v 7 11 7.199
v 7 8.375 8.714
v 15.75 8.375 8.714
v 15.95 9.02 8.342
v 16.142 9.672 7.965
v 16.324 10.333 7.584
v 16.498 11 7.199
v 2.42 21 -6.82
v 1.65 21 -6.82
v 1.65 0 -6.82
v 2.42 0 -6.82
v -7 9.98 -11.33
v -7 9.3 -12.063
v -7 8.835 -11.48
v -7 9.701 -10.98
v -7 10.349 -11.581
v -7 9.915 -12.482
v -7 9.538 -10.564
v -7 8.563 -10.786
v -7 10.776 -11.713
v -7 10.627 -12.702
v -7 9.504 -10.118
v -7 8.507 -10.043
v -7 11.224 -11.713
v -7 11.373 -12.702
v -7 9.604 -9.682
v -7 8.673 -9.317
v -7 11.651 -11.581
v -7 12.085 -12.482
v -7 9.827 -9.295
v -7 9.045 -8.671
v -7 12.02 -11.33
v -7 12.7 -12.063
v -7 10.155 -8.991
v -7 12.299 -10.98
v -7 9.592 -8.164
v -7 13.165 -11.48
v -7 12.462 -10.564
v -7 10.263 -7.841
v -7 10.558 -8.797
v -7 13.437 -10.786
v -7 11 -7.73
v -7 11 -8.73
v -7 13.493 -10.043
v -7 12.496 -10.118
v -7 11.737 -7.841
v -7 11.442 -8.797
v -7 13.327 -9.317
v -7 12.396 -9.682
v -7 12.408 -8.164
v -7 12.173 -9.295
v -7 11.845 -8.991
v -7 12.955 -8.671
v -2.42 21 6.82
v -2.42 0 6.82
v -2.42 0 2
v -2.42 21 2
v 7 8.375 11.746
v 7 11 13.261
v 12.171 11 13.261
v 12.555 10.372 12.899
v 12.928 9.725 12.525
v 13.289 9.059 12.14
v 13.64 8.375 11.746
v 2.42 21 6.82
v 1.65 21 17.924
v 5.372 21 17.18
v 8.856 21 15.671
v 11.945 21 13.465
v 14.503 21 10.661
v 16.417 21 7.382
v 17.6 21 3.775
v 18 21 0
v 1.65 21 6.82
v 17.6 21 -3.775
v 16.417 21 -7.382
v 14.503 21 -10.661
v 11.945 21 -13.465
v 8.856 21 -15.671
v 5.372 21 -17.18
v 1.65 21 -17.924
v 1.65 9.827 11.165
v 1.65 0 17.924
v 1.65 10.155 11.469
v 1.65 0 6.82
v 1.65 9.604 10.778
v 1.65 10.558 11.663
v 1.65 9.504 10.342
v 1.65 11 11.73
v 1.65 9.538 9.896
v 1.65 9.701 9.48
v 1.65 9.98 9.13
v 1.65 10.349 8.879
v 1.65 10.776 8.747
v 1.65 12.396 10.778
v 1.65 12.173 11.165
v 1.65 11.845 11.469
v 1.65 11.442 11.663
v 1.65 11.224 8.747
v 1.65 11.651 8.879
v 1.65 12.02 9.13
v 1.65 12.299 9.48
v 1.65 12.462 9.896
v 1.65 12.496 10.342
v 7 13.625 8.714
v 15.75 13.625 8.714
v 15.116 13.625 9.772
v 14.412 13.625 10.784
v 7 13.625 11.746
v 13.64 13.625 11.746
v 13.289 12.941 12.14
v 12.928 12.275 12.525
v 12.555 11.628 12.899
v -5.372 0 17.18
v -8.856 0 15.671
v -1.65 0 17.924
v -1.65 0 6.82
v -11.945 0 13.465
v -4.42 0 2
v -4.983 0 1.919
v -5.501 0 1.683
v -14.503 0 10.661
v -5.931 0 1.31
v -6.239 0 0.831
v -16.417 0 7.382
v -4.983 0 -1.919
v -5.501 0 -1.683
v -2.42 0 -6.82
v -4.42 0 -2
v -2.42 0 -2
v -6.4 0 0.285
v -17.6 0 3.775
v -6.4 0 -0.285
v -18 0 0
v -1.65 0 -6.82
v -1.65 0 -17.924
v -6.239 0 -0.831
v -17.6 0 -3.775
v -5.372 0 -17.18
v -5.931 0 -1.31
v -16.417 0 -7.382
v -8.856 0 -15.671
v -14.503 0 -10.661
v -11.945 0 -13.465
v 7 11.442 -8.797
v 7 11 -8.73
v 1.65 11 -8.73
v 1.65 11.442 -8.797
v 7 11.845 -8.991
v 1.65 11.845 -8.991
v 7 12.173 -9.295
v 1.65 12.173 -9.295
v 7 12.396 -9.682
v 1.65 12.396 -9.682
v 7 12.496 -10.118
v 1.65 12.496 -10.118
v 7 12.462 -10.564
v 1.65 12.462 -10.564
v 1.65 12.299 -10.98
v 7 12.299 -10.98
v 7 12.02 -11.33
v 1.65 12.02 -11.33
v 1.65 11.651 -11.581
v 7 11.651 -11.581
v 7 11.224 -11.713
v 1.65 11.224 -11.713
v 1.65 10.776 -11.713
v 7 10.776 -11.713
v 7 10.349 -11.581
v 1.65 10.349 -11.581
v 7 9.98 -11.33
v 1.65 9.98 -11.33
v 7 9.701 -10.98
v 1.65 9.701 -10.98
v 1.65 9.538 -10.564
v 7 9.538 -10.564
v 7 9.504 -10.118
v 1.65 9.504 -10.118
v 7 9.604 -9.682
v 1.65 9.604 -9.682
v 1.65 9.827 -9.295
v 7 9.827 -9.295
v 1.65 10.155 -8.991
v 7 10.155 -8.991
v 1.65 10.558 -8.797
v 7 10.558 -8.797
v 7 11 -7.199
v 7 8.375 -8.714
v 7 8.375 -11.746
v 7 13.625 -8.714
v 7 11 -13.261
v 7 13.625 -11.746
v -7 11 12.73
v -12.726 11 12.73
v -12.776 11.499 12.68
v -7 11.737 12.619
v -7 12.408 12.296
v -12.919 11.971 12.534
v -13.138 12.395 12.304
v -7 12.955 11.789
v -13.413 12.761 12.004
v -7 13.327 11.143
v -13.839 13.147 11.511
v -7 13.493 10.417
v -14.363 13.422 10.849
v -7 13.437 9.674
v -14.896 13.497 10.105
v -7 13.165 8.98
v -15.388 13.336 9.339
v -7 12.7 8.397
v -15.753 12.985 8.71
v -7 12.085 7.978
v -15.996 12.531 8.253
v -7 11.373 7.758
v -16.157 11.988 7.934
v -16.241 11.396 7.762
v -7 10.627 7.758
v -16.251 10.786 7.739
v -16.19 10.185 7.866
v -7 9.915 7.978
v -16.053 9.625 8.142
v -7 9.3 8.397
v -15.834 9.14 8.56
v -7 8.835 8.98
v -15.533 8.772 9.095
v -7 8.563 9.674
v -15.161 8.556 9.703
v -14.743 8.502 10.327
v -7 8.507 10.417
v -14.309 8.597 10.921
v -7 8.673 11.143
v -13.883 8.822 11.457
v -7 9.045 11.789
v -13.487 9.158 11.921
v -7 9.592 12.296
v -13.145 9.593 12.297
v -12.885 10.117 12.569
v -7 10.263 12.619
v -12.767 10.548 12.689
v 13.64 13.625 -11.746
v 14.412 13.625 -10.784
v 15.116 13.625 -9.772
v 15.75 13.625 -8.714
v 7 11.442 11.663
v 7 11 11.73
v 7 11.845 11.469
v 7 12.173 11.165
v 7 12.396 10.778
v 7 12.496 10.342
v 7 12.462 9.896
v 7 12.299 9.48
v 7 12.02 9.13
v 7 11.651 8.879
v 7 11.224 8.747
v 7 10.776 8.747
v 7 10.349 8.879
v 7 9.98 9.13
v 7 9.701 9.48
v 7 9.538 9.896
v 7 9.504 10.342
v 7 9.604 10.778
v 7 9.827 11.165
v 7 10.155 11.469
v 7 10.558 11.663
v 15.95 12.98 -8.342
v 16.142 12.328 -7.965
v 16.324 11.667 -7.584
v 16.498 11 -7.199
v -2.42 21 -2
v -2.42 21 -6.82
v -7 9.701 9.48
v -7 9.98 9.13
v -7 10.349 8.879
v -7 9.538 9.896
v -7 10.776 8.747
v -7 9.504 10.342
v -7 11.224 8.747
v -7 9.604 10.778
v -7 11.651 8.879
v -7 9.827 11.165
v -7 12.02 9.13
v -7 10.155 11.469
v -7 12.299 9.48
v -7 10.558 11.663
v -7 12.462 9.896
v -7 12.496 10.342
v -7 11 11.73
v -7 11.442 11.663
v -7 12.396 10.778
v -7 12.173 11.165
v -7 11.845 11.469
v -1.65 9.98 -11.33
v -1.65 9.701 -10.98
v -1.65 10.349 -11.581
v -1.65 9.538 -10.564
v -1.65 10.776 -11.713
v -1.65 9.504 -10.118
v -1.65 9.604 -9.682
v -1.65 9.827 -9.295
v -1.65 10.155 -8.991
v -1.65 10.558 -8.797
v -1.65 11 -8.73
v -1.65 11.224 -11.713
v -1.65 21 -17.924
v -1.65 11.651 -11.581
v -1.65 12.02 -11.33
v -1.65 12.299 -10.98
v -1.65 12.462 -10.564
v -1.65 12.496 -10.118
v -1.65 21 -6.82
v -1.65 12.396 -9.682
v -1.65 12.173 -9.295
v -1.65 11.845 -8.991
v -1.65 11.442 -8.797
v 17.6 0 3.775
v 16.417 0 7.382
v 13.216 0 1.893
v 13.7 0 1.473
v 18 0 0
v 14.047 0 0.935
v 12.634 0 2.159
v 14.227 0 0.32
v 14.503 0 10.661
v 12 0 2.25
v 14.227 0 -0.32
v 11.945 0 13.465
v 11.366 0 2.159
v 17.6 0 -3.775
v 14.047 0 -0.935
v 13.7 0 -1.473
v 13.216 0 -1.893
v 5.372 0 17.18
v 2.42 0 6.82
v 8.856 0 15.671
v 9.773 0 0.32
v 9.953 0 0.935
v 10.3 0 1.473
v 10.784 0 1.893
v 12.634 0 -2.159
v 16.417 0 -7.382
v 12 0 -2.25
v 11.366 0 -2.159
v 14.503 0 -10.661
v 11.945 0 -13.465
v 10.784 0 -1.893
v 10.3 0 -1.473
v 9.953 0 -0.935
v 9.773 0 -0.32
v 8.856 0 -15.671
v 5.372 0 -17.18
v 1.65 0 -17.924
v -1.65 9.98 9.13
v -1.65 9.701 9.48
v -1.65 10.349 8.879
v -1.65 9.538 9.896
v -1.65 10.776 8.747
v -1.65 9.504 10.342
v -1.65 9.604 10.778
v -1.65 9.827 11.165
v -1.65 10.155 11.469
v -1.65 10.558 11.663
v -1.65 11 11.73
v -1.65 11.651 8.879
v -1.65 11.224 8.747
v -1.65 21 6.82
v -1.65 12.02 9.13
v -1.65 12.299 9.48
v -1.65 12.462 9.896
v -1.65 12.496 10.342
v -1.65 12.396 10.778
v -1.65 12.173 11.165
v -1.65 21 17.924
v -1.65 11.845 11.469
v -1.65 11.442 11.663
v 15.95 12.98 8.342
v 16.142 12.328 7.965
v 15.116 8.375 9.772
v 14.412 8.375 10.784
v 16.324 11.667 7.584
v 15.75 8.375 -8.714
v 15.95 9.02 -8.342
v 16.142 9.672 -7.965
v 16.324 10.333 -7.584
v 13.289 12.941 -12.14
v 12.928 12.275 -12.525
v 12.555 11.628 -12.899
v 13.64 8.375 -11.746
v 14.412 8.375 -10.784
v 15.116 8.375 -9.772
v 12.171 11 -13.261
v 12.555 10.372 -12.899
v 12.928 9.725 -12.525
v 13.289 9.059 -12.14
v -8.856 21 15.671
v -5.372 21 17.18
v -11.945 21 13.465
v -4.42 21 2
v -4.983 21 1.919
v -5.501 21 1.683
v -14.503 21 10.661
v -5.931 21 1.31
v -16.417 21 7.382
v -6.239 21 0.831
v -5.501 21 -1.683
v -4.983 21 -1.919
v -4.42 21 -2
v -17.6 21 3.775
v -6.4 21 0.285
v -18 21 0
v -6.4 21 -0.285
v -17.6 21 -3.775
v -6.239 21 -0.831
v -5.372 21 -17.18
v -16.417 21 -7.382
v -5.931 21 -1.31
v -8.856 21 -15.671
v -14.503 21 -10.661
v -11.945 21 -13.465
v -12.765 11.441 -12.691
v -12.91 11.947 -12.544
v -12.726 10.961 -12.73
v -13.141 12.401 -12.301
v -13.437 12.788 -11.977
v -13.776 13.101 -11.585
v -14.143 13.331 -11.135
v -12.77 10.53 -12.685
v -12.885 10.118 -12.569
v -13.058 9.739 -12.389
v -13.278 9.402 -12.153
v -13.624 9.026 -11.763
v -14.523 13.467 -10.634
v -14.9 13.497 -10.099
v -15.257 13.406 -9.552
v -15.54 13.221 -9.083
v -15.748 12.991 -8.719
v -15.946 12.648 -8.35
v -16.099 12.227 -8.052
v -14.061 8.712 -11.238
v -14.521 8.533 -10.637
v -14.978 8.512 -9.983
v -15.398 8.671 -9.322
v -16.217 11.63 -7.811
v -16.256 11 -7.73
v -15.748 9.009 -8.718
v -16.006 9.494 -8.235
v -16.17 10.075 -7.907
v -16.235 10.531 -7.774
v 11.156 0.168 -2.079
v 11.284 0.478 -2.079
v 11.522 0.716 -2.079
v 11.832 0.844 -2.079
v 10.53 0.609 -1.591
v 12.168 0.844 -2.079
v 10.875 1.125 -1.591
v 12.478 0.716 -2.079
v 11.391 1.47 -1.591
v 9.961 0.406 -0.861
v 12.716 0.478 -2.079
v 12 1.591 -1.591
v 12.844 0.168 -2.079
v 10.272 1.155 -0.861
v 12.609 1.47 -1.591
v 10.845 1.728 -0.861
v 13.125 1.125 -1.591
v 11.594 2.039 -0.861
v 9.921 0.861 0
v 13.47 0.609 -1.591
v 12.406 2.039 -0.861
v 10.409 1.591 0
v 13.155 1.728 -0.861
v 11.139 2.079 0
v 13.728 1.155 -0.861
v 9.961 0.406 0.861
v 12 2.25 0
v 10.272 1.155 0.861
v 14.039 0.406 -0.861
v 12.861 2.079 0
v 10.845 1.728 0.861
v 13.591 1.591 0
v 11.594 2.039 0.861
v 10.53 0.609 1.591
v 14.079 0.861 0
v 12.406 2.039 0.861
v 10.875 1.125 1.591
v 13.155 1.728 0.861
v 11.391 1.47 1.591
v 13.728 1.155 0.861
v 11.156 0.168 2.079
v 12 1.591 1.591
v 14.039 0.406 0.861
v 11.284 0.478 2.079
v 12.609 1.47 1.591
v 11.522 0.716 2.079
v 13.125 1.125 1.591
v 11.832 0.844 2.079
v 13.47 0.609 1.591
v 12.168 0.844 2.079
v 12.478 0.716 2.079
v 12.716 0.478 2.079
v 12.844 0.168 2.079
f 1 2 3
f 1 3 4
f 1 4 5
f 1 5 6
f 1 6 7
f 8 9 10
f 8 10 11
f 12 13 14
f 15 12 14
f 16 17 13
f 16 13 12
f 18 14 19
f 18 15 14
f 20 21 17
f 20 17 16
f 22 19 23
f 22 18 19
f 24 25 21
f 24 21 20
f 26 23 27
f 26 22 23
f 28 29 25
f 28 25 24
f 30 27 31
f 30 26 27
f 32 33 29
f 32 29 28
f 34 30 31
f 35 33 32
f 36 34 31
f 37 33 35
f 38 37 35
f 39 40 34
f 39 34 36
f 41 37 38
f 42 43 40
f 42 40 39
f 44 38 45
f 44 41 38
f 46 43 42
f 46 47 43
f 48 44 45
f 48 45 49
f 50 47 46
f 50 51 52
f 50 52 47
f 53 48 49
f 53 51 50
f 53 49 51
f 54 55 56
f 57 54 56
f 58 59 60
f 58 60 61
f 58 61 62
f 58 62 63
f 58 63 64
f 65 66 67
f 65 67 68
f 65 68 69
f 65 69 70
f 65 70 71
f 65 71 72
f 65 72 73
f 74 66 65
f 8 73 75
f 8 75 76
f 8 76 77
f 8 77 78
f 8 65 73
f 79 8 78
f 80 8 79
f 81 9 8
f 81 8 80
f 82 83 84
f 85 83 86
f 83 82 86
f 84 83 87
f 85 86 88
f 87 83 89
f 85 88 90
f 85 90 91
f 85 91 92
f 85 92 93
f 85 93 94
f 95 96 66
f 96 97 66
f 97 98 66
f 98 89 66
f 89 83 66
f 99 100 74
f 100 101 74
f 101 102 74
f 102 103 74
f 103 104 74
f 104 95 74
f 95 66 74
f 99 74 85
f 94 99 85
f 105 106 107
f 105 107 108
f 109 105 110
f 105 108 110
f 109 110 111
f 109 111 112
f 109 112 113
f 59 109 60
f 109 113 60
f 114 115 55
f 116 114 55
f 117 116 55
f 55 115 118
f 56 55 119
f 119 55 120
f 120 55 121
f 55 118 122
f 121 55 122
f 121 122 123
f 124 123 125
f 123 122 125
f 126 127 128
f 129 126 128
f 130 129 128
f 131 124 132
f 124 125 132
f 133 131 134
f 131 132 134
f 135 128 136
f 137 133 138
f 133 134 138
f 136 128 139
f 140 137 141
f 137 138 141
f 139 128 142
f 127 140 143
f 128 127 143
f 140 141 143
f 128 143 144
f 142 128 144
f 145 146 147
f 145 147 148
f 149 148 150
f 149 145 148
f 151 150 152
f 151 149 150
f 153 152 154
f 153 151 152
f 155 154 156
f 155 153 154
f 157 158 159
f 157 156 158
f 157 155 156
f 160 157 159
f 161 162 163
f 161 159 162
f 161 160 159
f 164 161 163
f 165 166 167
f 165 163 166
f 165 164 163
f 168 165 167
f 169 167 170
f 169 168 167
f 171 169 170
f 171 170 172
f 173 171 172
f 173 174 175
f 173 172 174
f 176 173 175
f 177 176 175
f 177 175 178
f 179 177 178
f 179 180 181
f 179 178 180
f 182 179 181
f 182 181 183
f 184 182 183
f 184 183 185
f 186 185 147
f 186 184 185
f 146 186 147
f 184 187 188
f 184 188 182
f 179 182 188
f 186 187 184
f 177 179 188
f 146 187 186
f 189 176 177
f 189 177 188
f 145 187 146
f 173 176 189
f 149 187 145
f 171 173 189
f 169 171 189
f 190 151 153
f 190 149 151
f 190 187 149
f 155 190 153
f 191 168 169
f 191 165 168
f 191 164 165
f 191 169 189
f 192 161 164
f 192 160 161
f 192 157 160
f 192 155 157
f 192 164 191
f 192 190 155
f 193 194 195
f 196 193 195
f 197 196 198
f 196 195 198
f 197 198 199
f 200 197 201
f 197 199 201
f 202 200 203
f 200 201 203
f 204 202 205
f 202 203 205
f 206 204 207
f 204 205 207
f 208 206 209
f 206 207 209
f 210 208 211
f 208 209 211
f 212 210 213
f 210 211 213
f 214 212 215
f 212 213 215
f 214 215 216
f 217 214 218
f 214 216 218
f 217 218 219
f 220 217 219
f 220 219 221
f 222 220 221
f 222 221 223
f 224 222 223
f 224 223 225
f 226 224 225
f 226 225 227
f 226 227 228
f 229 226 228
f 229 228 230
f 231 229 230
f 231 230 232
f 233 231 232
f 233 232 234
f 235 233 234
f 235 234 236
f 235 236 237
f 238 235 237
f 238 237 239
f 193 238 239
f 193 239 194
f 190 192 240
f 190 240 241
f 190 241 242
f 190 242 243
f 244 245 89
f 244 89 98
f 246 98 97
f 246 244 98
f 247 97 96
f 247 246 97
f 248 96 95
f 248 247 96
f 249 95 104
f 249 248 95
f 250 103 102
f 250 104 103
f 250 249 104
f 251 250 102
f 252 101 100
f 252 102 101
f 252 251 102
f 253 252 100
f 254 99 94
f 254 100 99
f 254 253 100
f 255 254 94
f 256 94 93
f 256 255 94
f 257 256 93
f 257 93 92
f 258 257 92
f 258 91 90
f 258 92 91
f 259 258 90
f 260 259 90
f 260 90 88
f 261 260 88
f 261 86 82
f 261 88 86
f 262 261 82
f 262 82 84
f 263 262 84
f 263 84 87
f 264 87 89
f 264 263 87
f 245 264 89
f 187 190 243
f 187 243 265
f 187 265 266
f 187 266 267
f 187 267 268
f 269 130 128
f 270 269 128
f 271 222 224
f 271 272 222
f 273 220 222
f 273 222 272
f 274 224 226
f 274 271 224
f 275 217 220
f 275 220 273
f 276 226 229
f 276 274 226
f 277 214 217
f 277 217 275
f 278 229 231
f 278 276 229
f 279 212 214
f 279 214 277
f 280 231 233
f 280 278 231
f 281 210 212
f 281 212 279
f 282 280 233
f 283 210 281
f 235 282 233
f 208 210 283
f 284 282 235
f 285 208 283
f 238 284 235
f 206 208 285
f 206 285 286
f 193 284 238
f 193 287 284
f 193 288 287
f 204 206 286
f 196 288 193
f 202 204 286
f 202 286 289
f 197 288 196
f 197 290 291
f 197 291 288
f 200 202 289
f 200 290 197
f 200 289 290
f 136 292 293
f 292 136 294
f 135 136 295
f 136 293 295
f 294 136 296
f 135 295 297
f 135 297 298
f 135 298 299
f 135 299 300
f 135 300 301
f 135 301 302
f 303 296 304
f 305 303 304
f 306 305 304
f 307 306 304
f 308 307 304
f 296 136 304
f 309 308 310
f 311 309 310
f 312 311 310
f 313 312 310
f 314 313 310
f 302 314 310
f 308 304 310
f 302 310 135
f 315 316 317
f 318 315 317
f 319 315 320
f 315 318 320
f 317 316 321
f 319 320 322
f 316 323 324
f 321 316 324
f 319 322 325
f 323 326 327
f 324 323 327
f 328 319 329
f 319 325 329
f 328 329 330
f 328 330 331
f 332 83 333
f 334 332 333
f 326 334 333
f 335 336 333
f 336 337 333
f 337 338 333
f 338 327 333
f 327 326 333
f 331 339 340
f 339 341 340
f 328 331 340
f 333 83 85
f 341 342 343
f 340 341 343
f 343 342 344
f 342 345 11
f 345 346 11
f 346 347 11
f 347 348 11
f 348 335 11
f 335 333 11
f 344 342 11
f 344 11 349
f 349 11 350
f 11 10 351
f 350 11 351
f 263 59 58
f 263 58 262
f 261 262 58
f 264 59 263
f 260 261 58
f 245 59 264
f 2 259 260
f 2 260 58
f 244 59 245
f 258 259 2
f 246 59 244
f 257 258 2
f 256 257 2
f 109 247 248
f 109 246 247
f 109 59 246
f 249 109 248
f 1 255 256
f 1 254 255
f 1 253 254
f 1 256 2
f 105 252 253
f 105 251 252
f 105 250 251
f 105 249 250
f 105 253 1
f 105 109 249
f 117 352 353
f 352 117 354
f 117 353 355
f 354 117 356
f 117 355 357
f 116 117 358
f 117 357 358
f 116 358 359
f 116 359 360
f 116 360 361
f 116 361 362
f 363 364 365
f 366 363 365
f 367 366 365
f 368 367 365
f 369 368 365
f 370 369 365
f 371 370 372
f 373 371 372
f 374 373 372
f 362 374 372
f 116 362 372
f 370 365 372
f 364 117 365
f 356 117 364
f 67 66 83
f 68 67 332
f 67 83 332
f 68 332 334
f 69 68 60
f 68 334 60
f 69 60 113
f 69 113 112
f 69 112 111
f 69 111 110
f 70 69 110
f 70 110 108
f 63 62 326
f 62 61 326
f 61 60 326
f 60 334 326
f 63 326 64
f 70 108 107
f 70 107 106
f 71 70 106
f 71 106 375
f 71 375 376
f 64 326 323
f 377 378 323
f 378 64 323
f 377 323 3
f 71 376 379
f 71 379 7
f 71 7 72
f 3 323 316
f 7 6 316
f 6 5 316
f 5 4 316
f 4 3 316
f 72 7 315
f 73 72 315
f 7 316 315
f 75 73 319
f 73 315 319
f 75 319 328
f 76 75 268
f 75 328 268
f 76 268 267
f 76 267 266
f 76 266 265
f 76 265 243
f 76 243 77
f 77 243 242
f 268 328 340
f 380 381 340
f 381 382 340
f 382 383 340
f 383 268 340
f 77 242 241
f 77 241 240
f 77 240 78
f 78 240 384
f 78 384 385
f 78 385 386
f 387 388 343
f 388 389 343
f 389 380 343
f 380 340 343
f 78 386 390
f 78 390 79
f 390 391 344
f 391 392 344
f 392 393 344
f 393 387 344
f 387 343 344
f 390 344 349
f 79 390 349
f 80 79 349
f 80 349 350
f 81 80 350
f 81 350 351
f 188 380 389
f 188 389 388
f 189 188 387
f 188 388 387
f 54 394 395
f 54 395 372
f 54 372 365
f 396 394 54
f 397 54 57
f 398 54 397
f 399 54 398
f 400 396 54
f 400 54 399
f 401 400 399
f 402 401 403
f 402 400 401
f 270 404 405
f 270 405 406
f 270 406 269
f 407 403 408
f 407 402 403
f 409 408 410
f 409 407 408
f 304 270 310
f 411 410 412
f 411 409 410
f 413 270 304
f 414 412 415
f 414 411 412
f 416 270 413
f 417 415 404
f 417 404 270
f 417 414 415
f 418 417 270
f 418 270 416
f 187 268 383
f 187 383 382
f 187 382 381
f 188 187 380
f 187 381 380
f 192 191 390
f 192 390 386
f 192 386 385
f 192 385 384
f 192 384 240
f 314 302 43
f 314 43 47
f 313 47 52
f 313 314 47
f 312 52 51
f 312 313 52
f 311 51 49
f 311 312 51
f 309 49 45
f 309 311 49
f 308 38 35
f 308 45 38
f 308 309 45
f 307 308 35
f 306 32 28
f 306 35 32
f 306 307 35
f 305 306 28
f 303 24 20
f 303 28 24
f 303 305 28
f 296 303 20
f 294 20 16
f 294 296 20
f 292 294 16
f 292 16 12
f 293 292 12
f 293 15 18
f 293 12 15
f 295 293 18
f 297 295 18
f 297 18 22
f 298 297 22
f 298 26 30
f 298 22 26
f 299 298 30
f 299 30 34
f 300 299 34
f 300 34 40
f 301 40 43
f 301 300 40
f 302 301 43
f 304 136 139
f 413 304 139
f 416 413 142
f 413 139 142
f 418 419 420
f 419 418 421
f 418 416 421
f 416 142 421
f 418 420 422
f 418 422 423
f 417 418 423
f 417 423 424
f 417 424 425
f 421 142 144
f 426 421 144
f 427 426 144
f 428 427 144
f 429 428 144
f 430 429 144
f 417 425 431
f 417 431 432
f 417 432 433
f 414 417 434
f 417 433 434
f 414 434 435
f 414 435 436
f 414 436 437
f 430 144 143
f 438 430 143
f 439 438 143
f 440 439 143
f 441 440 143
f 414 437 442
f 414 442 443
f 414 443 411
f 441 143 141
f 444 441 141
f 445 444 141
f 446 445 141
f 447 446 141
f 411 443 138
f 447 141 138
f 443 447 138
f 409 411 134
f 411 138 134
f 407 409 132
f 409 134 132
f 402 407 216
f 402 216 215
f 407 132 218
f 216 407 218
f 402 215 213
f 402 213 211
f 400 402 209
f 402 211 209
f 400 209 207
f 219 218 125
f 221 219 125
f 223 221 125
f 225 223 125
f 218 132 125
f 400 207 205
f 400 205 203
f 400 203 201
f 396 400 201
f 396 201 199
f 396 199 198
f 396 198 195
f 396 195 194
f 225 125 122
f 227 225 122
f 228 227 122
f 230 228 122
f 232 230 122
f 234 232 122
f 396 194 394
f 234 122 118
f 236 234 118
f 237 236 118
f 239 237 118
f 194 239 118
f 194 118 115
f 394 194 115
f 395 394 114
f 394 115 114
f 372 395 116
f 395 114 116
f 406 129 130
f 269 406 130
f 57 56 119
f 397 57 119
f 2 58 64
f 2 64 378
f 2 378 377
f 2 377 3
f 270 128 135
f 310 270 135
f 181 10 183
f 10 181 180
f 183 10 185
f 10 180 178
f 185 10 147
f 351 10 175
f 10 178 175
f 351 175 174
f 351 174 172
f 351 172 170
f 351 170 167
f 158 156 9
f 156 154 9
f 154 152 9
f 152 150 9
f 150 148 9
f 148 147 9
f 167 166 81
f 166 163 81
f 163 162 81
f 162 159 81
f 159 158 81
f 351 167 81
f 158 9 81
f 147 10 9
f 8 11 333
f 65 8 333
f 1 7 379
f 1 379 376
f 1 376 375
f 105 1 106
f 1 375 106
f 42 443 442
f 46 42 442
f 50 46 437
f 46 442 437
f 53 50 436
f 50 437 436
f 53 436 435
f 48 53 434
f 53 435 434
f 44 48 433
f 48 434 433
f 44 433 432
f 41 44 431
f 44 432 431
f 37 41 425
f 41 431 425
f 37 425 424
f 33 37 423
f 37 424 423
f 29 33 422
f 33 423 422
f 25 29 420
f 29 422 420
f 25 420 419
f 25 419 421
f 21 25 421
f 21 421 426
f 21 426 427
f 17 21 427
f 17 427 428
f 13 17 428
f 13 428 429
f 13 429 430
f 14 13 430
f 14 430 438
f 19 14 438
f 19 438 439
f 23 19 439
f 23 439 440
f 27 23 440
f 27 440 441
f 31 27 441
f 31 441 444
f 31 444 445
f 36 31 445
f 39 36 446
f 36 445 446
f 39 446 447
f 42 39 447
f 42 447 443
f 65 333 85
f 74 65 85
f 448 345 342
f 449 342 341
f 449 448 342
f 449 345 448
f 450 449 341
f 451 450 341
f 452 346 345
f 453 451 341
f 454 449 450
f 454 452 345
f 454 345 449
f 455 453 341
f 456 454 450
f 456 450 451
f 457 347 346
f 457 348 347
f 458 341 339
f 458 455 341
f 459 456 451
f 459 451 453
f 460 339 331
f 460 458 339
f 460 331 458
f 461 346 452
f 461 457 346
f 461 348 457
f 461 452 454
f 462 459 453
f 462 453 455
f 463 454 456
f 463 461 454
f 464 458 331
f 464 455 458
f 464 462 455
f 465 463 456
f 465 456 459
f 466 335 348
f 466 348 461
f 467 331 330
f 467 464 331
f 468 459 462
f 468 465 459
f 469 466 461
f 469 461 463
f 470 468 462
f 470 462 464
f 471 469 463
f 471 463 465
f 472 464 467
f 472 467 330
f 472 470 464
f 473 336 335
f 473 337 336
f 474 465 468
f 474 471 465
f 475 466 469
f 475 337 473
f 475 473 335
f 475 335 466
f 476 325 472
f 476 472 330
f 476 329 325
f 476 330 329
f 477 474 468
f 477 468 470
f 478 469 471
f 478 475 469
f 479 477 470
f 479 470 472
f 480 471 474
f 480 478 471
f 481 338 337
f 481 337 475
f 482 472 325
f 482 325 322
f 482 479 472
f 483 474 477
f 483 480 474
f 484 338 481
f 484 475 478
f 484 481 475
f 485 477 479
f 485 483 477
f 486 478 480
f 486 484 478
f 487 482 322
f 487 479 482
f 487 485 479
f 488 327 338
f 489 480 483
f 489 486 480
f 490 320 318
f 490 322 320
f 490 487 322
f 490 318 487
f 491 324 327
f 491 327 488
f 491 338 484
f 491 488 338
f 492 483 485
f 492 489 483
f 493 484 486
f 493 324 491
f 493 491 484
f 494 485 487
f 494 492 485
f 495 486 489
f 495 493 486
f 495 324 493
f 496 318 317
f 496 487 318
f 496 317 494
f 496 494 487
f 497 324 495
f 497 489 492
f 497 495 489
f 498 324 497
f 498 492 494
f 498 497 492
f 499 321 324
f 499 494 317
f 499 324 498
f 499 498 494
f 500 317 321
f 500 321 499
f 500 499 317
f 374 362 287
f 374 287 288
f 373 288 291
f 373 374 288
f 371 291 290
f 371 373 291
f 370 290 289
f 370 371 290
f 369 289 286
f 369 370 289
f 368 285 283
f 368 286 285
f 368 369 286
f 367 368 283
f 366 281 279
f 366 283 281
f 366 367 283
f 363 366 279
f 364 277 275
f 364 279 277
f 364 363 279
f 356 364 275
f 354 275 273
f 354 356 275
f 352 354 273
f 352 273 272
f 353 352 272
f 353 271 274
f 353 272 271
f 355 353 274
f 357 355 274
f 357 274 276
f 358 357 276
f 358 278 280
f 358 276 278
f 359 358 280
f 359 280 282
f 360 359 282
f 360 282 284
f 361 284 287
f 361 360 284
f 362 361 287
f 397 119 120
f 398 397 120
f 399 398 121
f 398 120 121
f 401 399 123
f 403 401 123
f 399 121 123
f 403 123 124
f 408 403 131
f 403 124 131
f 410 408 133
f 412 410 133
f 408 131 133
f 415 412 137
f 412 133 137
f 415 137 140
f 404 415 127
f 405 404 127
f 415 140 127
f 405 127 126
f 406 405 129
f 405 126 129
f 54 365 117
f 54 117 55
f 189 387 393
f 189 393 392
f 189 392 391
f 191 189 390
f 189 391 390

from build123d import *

# Parameters (mm, degrees)
SKETCH1_R               = 18
BOSS_EXTRUDE1_DEPTH     = 21
CUT_EXTRUDE1_DEPTH      = 34
CUT_EXTRUDE1_DEPTH_BACK = 34
CUT_EXTRUDE2_DEPTH      = 46.398237851
CUT_EXTRUDE2_DEPTH_BACK = 46.398237851
SKETCH7_R               = 1.5
SKETCH8_R               = 2.5
CUT_EXTRUDE3_DEPTH      = 11
CUT_EXTRUDE4_DEPTH      = 11
CUT_EXTRUDE7_DEPTH      = 34.000000173


with BuildPart() as part:
    # Sketch1 → Boss-Extrude1 (new body)
    with BuildSketch(Plane(origin=(0, 0, 0), x_dir=(1, 0, 0), z_dir=(0, 1, 0))):
        with Locations(Location((0, 0, 0), (0, 0, 90))):
            Circle(SKETCH1_R)
    extrude(amount=BOSS_EXTRUDE1_DEPTH)

    # Sketch5 → Cut-Revolve2 (revolve, cut)
    with BuildSketch(Plane(origin=(0, 0, 0), x_dir=(-1, 0, 0), z_dir=(0, -1, 0))):
        with BuildLine():
            Line((-12, -2.25), (-12, 2.25))
            ThreePointArc((-12, 2.25), (-9.75, 0), (-12, -2.25))
        make_face()
    revolve(axis=Axis((12, 0, 2.25), (0, 0, -1)), mode=Mode.SUBTRACT)

    # Sketch6 → Cut-Extrude1 (cut, two sides: drawn at the far end of the back side and taken through both)
    with BuildSketch(Plane(origin=(0, 21, 0), x_dir=(1, 0, 0), z_dir=(0, 1, 0)).offset(-CUT_EXTRUDE1_DEPTH_BACK)):
        with BuildLine():
            Line((-4.42, 2), (-2.42, 2))
            Line((-2.42, 2), (-2.42, 6.82))
            Line((-2.42, 6.82), (2.42, 6.82))
            Line((2.42, 6.82), (2.42, -6.82))
            Line((2.42, -6.82), (-2.42, -6.82))
            Line((-2.42, -6.82), (-2.42, -2))
            Line((-2.42, -2), (-4.42, -2))
            ThreePointArc((-4.42, -2), (-6.42, 0), (-4.42, 2))
        make_face()
    extrude(amount=CUT_EXTRUDE1_DEPTH + CUT_EXTRUDE1_DEPTH_BACK, mode=Mode.SUBTRACT)

    # Sketch7 → Cut-Extrude2 (cut, two sides: drawn at the far end of the back side and taken through both)
    with BuildSketch(Plane.ZY.offset(18).offset(-CUT_EXTRUDE2_DEPTH_BACK)):
        with Locations((-10.23, 11)):
            Circle(SKETCH7_R)
        with Locations((10.23, 11)):
            Circle(SKETCH7_R)
    extrude(amount=CUT_EXTRUDE2_DEPTH + CUT_EXTRUDE2_DEPTH_BACK, mode=Mode.SUBTRACT)

    # Sketch8 → Cut-Extrude3 (cut)
    with BuildSketch(Plane.ZY.offset(18)):
        with Locations((-10.23, 11)):
            Circle(SKETCH8_R)
        with Locations((10.23, 11)):
            Circle(SKETCH8_R)
    extrude(amount=-CUT_EXTRUDE3_DEPTH, mode=Mode.SUBTRACT)

    # Sketch9 → Cut-Extrude4 (cut)
    with BuildSketch(Plane(origin=(18, 0, 0), x_dir=(0, 0, -1), z_dir=(1, 0, 0))):
        Polygon((-8.714455543, 13.625), (-11.745544457, 13.625), (-13.261088913, 11), (-11.745544457, 8.375), (-8.714455543, 8.375), (-7.198911087, 11), align=None)
        Polygon((11.745544457, 13.625), (8.714455543, 13.625), (7.198911087, 11), (8.714455543, 8.375), (11.745544457, 8.375), (13.261088913, 11), align=None)
    extrude(amount=-CUT_EXTRUDE4_DEPTH, mode=Mode.SUBTRACT)

    # Sketch14 → Cut-Extrude7 (cut, through all)
    with BuildSketch(Plane(origin=(0, 21, 0), x_dir=(1, 0, 0), z_dir=(0, 1, 0))):
        with BuildLine():
            ThreePointArc((1.65, 17.924215464), (0.825869738, 17.981043884), (0, 18))
            ThreePointArc((0, 18), (-0.825869738, 17.981043884), (-1.65, 17.924215464))
            Line((-1.65, 17.924215464), (-1.65, 6.82))
            Line((-1.65, 6.82), (1.65, 6.82))
            Line((1.65, 6.82), (1.65, 17.924215464))
        make_face()
        with BuildLine():
            Line((-1.65, -6.82), (-1.65, -17.924215464))
            ThreePointArc((-1.65, -17.924215464), (-0.825869738, -17.981043884), (0, -18))
            ThreePointArc((0, -18), (0.825869738, -17.981043884), (1.65, -17.924215464))
            Line((1.65, -17.924215464), (1.65, -6.82))
            Line((1.65, -6.82), (-1.65, -6.82))
        make_face()
    extrude(amount=-CUT_EXTRUDE7_DEPTH, mode=Mode.SUBTRACT)


with BuildPart() as cut_extrude7_piece_1:
    # of the separate pieces the step leaves, piece 1, a body of its own (cut_extrude7_pieces)
    add(part.part.solids().sort_by_distance((1.65, 21, -17.924215464))[0])


with BuildPart() as cut_extrude7_piece_2:
    # of the separate pieces the step leaves, piece 2, a body of its own (cut_extrude7_pieces)
    add(part.part.solids().sort_by_distance((-1.65, 0, -17.924215464))[0])


solid = Compound([cut_extrude7_piece_1.part, cut_extrude7_piece_2.part])
